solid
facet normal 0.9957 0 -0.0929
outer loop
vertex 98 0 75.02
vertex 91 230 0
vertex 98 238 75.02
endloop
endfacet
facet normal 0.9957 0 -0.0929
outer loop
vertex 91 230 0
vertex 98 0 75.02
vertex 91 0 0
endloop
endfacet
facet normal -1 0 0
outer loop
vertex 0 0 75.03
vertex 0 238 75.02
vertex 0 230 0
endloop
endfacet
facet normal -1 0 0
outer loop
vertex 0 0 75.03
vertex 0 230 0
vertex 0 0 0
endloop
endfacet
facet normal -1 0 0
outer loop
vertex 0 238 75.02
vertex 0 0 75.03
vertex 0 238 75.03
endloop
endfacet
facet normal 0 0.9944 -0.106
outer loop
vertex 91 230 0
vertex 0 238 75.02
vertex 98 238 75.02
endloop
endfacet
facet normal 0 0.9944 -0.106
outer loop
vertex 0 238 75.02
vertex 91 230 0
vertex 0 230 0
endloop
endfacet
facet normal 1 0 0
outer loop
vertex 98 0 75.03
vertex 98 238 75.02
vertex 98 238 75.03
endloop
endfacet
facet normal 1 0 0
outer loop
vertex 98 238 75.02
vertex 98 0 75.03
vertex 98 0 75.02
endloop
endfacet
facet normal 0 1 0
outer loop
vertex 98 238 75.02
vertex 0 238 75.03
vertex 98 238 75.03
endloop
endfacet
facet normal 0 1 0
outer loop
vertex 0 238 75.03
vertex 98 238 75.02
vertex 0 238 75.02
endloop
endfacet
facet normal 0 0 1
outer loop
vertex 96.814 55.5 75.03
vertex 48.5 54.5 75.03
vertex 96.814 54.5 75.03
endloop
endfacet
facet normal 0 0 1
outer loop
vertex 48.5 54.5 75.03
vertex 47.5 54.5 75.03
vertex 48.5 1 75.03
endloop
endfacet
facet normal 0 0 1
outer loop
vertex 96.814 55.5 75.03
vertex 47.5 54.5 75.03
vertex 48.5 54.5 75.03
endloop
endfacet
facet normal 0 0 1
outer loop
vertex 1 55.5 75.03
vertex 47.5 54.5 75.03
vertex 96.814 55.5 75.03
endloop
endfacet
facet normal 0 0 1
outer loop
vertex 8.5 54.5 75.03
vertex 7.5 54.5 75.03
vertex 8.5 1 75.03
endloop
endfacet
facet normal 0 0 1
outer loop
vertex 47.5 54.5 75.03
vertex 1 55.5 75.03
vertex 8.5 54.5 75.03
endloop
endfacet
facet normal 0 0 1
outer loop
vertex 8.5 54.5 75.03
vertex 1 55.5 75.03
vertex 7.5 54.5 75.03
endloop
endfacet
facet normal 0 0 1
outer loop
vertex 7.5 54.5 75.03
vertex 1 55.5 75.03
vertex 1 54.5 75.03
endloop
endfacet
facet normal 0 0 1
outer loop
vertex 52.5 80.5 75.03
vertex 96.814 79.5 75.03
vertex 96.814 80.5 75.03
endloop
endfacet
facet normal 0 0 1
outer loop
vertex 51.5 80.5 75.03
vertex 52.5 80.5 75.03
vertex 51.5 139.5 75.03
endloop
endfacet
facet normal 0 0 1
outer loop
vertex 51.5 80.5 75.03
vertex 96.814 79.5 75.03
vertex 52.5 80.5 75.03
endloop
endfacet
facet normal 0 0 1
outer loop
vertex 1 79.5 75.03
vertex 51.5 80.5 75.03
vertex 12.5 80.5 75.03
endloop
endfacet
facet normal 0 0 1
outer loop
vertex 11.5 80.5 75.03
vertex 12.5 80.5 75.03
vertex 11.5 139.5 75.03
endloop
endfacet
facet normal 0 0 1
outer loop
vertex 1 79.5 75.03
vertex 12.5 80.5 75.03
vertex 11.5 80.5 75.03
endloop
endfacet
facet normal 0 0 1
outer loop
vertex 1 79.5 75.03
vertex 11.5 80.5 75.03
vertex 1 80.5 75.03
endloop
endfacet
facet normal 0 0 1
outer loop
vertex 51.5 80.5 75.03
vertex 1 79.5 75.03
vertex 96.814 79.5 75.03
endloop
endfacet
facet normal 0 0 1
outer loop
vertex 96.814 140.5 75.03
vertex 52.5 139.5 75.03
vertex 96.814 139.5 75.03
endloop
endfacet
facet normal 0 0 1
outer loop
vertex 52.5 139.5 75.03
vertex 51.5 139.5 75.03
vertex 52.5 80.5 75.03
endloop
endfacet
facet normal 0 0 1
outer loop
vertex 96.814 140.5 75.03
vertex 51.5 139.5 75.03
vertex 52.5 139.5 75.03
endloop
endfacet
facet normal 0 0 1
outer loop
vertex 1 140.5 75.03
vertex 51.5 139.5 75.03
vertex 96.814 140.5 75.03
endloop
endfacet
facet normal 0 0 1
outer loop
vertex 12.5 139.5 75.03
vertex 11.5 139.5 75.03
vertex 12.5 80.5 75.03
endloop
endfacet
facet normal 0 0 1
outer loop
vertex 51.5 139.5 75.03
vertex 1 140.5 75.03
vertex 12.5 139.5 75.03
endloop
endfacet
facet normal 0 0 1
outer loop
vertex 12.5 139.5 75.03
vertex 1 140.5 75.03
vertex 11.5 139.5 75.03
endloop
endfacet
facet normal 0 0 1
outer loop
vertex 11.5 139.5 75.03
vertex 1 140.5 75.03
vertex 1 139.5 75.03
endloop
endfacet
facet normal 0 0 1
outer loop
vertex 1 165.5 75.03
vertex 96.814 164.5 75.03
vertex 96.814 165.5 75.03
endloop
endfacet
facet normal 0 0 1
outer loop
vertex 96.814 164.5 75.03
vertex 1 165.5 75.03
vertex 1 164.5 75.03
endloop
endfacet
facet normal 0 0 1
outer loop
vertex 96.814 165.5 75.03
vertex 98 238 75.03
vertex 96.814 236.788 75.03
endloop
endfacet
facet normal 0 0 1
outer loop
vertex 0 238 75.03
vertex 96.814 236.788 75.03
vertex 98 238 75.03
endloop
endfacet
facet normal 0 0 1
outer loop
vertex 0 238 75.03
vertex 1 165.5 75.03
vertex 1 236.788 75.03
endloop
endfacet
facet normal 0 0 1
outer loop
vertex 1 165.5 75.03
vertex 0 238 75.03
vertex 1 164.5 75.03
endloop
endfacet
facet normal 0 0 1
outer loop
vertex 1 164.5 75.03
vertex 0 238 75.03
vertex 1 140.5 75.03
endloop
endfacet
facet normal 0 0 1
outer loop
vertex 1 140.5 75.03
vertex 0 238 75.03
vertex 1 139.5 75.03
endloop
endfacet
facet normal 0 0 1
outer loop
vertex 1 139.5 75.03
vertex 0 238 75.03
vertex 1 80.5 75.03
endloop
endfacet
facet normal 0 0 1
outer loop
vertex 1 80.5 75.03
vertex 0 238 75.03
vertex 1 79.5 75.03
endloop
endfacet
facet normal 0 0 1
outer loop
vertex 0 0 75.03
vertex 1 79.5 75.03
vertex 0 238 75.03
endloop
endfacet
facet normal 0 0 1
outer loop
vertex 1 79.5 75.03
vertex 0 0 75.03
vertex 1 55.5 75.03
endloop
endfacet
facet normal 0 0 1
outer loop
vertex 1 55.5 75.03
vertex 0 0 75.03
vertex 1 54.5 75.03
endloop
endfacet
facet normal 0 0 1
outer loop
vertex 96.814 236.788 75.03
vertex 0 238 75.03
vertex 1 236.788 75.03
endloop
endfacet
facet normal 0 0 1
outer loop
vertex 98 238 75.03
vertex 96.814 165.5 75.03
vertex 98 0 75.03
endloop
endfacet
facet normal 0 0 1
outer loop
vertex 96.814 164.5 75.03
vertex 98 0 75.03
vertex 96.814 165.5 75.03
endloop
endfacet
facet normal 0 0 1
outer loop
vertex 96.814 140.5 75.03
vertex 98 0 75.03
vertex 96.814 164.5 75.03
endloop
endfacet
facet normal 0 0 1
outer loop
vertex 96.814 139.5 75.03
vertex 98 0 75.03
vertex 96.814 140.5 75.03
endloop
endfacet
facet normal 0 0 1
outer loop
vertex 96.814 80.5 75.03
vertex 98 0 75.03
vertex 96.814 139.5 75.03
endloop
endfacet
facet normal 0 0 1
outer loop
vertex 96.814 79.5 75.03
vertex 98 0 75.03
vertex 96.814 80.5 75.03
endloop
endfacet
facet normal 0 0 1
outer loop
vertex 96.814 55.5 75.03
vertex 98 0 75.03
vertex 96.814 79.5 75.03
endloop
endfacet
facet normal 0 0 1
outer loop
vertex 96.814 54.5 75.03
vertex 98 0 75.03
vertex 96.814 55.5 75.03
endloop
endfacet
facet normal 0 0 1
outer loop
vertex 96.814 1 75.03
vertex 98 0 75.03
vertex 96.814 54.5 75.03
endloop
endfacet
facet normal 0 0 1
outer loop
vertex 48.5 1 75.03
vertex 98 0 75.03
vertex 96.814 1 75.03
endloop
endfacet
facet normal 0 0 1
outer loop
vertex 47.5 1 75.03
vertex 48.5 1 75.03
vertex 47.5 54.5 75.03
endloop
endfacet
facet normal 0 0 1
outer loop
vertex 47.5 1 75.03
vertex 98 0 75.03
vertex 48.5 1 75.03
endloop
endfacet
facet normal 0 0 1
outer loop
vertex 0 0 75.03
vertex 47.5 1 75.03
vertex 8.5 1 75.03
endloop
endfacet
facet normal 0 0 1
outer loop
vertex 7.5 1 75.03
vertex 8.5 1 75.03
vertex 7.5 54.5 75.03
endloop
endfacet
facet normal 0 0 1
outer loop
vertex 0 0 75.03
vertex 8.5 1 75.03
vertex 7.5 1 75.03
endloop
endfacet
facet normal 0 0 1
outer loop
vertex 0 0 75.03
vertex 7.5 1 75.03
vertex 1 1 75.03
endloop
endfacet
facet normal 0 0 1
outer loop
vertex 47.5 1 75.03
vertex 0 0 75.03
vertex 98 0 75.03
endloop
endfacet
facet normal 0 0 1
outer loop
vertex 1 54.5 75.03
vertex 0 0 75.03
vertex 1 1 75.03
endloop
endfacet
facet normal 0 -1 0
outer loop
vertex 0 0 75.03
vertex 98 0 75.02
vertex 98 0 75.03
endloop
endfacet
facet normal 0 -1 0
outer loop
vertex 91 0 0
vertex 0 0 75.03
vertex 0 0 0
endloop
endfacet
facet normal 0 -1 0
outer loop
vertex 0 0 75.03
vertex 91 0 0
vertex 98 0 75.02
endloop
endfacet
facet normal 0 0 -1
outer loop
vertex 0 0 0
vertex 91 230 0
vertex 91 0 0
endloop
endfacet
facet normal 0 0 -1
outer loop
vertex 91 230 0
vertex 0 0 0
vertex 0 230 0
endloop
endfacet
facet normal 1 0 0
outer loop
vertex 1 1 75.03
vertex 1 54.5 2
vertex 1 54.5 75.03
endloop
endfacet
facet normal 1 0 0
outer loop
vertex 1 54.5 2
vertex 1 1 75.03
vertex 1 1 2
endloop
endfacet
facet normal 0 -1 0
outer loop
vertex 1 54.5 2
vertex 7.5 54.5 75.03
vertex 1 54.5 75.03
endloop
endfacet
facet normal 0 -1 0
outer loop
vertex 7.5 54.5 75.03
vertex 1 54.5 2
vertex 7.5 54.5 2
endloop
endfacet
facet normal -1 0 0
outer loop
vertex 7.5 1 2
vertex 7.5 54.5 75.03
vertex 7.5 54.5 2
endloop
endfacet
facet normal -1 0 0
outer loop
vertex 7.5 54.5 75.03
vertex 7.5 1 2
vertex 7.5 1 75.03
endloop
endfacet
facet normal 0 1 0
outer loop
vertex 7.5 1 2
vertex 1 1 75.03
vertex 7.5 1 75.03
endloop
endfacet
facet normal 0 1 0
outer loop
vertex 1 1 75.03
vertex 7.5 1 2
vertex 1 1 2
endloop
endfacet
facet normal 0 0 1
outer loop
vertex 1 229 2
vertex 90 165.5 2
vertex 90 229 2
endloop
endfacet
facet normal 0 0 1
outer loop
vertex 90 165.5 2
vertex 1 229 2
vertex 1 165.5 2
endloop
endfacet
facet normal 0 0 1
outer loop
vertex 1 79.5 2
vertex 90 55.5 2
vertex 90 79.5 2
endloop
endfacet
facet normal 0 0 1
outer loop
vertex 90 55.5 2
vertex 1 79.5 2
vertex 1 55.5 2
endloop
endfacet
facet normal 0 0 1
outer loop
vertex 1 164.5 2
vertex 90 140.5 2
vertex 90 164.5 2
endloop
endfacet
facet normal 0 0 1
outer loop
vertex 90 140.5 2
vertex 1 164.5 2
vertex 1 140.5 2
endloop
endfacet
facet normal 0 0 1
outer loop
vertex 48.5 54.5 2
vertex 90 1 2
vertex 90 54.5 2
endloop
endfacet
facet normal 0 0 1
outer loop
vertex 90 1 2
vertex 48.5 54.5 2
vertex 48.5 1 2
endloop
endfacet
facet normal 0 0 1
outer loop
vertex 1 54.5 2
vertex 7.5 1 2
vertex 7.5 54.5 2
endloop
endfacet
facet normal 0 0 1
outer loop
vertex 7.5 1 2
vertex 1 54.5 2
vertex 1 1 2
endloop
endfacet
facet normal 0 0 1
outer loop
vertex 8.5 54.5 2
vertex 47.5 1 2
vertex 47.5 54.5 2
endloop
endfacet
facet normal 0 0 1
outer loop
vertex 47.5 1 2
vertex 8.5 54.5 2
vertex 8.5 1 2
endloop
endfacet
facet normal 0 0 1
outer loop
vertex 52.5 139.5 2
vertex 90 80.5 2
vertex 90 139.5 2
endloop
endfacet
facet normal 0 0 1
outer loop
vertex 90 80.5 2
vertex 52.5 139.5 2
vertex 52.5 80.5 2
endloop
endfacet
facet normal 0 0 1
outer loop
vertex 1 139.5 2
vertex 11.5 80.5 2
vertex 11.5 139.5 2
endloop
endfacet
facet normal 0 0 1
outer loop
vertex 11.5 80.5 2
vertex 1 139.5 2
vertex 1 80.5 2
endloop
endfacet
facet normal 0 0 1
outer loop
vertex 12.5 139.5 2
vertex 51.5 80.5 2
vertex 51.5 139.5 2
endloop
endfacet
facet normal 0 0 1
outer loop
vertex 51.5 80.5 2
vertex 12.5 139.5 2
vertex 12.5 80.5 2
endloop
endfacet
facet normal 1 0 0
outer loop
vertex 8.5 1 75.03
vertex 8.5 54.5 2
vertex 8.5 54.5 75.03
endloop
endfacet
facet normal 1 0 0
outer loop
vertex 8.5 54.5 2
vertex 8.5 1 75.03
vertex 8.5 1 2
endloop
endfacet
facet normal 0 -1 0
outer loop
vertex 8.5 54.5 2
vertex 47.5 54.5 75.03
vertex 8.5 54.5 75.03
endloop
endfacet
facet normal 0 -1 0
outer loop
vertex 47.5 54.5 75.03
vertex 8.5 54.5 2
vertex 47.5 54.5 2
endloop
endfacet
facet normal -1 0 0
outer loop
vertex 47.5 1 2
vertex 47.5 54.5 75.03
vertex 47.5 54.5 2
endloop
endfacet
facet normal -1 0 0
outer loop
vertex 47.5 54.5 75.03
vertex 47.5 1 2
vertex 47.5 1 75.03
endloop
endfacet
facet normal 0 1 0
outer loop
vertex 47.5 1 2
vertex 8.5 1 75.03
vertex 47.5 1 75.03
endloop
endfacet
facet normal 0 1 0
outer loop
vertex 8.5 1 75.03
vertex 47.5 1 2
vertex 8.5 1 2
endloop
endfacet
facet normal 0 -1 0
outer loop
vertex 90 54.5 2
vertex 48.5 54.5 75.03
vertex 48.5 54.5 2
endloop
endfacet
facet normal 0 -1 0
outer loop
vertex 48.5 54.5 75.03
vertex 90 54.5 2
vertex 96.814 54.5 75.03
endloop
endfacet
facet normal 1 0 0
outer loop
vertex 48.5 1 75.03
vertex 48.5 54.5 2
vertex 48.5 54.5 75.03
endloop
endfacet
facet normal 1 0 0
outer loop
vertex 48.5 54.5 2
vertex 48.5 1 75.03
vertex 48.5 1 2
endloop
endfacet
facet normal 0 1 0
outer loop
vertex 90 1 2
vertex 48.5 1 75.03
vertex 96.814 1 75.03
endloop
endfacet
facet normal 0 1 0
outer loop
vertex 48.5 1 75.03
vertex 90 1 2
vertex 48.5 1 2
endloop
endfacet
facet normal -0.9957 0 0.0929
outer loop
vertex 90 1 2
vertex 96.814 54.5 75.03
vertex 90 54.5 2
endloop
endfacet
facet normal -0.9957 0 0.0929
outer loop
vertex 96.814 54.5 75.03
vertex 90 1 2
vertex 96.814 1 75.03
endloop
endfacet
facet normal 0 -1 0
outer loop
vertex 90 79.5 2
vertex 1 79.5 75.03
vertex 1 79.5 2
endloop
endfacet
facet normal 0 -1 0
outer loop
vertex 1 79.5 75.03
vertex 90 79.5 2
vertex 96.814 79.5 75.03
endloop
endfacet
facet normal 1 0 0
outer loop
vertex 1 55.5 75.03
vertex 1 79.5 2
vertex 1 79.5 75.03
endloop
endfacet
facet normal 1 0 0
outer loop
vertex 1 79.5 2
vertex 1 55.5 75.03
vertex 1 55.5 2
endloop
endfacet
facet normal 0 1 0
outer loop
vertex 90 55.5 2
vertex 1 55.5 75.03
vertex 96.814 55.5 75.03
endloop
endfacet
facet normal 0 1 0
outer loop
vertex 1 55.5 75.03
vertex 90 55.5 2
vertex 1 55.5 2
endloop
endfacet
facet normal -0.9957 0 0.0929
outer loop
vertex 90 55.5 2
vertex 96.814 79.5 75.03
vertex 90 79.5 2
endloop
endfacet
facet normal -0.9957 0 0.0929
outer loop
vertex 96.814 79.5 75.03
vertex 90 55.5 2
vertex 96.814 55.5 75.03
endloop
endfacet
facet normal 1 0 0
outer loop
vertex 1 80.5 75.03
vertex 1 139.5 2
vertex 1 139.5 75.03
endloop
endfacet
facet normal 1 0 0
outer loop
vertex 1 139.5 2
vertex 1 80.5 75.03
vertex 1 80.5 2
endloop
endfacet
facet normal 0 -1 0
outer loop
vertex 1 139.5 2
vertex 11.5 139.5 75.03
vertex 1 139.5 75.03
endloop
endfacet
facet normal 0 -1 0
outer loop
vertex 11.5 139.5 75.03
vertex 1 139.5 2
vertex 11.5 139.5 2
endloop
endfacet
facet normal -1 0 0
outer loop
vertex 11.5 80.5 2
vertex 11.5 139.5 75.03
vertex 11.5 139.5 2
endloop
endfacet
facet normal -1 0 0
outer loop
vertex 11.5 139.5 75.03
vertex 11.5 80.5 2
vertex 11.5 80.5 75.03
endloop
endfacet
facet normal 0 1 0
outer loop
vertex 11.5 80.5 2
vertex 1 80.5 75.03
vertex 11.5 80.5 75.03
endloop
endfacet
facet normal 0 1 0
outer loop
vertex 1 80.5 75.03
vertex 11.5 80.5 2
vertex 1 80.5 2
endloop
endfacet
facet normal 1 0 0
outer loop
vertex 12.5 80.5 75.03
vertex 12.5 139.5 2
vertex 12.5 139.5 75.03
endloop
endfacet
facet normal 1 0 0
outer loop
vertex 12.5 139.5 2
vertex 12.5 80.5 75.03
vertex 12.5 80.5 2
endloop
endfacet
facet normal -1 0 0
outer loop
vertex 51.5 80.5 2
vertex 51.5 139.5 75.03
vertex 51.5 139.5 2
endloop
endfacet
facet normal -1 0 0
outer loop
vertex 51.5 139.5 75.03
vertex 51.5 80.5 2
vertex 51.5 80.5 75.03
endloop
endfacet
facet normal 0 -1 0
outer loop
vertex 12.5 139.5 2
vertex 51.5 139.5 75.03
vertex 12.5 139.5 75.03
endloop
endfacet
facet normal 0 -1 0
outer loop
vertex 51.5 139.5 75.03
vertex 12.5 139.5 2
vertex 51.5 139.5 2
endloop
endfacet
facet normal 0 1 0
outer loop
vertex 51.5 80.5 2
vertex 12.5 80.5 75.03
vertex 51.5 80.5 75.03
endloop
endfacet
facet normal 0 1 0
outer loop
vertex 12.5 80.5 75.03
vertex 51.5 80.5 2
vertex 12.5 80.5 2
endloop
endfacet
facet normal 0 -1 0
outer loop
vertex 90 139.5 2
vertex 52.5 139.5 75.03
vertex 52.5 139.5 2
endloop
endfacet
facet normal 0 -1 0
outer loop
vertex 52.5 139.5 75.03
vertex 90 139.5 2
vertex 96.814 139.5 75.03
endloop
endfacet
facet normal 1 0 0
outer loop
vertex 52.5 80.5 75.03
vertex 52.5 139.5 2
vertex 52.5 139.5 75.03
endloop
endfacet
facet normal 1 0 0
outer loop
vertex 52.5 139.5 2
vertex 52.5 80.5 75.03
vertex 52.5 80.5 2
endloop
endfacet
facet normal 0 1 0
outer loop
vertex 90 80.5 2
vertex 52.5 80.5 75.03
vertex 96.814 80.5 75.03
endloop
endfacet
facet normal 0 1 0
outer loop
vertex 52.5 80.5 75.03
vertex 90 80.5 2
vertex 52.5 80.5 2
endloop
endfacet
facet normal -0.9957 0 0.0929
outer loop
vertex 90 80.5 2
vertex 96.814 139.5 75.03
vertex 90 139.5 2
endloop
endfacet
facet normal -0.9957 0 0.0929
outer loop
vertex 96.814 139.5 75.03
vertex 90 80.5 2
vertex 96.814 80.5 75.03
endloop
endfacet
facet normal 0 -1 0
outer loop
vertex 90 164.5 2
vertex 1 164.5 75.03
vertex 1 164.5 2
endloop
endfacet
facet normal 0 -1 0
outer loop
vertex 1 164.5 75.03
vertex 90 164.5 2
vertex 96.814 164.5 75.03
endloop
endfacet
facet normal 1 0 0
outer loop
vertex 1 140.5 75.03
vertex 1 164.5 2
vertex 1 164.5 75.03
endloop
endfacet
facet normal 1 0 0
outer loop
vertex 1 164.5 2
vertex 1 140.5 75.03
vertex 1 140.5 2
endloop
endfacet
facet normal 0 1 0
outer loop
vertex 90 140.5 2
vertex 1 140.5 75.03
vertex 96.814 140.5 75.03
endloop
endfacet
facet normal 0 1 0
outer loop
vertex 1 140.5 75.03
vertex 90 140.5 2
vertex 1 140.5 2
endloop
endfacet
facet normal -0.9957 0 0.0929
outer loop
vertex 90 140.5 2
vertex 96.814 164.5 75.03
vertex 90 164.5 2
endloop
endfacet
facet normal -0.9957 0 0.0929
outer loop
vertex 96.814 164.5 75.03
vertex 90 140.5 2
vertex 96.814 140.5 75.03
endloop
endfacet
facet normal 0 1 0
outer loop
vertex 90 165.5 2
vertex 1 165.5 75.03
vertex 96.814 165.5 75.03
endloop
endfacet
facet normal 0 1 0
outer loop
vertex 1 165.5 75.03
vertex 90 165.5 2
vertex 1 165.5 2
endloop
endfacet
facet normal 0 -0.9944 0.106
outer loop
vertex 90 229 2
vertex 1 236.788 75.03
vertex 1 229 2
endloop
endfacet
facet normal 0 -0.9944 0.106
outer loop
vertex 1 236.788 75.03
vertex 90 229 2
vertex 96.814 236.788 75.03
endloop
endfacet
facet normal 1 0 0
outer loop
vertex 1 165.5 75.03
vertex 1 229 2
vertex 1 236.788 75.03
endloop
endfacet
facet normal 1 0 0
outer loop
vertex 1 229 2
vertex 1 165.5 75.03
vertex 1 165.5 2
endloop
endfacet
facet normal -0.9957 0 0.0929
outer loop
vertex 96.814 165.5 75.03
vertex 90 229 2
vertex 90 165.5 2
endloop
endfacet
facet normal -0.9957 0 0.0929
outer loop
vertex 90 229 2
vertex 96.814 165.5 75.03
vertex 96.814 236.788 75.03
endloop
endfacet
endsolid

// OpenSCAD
// file: caddy_organizer_divider_common.scad
overlap=0.01;

/*
 * separate h,w for top and bottom defines the taper
 * centering defines whether the extra on top or bottom extends fully in the positive direction,
 * or extends equally in both directions.
 * flip***Wise shifts the larger end (top or bottom) in the negative direction so it
 * doesn't need to be mirrored & shifted externally.
 * clipBottomHeight cuts off the lower part of the box up to the height specified
 */
module taperedBox(bw, tw, bl, tl, ht, centerWidthwise=true, centerLengthwise=true, 
        flipWidthwise=false, flipLengthwise=false,
        clipBottomHeight=0) {
    extraWidth = abs(tw-bw);
    extraLength = abs(tl-bl);
    widerWidth = max(tw,bw);
    longerLength = max(tl,bl);
    // Don't shift if not centered and not flipped.
    // When centered
    // When not centered and flipped, shift negative direction
    topWidthShift = ((centerWidthwise) ? -(extraWidth/2) : ((flipWidthwise) ? -extraWidth : 0));
    topLengthShift = ((centerLengthwise) ? -(extraLength/2) : ((flipLengthwise) ? -extraLength : 0));
    echo(str("topWidthShift=",topWidthShift,", topLengthShift=",topLengthShift));
    difference() {
        hull() {
            translate([0,0,0]) 
                cube([bw,bl,overlap]);
            translate([topWidthShift,topLengthShift,ht+overlap])
                cube([tw,tl,overlap]);
        }
        // clip off the bottom of the box (when used as a shallow cutout)        
        translate([-widerWidth/2,-longerLength,-overlap])
            cube([widerWidth*2,longerLength*2,clipBottomHeight+overlap]);
    }
}
// main file
use <caddy_organizer_divider.scad>

// 2nd config for clear utility box from Walmart
bottomWidth=91;
topWidth=98;
bottomLength=230;
topLength=238;
wallHeight=75;
crosswaysDividerOffsets=[0,55,80,140,165];
lengthwiseSplits=[
    [0,8,48],[0],[0,12,52],[0],[0]];

caddyOrganizerDivider(bottomWidth=bottomWidth, topWidth=topWidth, bottomLength=bottomLength, 
    centerLengthwise=false, centerWidthwise=false,
    topLength=topLength, wallHeight=wallHeight,crosswaysDividerOffsets=crosswaysDividerOffsets,
    lengthwiseSplits=lengthwiseSplits,allFullDepth=true);
